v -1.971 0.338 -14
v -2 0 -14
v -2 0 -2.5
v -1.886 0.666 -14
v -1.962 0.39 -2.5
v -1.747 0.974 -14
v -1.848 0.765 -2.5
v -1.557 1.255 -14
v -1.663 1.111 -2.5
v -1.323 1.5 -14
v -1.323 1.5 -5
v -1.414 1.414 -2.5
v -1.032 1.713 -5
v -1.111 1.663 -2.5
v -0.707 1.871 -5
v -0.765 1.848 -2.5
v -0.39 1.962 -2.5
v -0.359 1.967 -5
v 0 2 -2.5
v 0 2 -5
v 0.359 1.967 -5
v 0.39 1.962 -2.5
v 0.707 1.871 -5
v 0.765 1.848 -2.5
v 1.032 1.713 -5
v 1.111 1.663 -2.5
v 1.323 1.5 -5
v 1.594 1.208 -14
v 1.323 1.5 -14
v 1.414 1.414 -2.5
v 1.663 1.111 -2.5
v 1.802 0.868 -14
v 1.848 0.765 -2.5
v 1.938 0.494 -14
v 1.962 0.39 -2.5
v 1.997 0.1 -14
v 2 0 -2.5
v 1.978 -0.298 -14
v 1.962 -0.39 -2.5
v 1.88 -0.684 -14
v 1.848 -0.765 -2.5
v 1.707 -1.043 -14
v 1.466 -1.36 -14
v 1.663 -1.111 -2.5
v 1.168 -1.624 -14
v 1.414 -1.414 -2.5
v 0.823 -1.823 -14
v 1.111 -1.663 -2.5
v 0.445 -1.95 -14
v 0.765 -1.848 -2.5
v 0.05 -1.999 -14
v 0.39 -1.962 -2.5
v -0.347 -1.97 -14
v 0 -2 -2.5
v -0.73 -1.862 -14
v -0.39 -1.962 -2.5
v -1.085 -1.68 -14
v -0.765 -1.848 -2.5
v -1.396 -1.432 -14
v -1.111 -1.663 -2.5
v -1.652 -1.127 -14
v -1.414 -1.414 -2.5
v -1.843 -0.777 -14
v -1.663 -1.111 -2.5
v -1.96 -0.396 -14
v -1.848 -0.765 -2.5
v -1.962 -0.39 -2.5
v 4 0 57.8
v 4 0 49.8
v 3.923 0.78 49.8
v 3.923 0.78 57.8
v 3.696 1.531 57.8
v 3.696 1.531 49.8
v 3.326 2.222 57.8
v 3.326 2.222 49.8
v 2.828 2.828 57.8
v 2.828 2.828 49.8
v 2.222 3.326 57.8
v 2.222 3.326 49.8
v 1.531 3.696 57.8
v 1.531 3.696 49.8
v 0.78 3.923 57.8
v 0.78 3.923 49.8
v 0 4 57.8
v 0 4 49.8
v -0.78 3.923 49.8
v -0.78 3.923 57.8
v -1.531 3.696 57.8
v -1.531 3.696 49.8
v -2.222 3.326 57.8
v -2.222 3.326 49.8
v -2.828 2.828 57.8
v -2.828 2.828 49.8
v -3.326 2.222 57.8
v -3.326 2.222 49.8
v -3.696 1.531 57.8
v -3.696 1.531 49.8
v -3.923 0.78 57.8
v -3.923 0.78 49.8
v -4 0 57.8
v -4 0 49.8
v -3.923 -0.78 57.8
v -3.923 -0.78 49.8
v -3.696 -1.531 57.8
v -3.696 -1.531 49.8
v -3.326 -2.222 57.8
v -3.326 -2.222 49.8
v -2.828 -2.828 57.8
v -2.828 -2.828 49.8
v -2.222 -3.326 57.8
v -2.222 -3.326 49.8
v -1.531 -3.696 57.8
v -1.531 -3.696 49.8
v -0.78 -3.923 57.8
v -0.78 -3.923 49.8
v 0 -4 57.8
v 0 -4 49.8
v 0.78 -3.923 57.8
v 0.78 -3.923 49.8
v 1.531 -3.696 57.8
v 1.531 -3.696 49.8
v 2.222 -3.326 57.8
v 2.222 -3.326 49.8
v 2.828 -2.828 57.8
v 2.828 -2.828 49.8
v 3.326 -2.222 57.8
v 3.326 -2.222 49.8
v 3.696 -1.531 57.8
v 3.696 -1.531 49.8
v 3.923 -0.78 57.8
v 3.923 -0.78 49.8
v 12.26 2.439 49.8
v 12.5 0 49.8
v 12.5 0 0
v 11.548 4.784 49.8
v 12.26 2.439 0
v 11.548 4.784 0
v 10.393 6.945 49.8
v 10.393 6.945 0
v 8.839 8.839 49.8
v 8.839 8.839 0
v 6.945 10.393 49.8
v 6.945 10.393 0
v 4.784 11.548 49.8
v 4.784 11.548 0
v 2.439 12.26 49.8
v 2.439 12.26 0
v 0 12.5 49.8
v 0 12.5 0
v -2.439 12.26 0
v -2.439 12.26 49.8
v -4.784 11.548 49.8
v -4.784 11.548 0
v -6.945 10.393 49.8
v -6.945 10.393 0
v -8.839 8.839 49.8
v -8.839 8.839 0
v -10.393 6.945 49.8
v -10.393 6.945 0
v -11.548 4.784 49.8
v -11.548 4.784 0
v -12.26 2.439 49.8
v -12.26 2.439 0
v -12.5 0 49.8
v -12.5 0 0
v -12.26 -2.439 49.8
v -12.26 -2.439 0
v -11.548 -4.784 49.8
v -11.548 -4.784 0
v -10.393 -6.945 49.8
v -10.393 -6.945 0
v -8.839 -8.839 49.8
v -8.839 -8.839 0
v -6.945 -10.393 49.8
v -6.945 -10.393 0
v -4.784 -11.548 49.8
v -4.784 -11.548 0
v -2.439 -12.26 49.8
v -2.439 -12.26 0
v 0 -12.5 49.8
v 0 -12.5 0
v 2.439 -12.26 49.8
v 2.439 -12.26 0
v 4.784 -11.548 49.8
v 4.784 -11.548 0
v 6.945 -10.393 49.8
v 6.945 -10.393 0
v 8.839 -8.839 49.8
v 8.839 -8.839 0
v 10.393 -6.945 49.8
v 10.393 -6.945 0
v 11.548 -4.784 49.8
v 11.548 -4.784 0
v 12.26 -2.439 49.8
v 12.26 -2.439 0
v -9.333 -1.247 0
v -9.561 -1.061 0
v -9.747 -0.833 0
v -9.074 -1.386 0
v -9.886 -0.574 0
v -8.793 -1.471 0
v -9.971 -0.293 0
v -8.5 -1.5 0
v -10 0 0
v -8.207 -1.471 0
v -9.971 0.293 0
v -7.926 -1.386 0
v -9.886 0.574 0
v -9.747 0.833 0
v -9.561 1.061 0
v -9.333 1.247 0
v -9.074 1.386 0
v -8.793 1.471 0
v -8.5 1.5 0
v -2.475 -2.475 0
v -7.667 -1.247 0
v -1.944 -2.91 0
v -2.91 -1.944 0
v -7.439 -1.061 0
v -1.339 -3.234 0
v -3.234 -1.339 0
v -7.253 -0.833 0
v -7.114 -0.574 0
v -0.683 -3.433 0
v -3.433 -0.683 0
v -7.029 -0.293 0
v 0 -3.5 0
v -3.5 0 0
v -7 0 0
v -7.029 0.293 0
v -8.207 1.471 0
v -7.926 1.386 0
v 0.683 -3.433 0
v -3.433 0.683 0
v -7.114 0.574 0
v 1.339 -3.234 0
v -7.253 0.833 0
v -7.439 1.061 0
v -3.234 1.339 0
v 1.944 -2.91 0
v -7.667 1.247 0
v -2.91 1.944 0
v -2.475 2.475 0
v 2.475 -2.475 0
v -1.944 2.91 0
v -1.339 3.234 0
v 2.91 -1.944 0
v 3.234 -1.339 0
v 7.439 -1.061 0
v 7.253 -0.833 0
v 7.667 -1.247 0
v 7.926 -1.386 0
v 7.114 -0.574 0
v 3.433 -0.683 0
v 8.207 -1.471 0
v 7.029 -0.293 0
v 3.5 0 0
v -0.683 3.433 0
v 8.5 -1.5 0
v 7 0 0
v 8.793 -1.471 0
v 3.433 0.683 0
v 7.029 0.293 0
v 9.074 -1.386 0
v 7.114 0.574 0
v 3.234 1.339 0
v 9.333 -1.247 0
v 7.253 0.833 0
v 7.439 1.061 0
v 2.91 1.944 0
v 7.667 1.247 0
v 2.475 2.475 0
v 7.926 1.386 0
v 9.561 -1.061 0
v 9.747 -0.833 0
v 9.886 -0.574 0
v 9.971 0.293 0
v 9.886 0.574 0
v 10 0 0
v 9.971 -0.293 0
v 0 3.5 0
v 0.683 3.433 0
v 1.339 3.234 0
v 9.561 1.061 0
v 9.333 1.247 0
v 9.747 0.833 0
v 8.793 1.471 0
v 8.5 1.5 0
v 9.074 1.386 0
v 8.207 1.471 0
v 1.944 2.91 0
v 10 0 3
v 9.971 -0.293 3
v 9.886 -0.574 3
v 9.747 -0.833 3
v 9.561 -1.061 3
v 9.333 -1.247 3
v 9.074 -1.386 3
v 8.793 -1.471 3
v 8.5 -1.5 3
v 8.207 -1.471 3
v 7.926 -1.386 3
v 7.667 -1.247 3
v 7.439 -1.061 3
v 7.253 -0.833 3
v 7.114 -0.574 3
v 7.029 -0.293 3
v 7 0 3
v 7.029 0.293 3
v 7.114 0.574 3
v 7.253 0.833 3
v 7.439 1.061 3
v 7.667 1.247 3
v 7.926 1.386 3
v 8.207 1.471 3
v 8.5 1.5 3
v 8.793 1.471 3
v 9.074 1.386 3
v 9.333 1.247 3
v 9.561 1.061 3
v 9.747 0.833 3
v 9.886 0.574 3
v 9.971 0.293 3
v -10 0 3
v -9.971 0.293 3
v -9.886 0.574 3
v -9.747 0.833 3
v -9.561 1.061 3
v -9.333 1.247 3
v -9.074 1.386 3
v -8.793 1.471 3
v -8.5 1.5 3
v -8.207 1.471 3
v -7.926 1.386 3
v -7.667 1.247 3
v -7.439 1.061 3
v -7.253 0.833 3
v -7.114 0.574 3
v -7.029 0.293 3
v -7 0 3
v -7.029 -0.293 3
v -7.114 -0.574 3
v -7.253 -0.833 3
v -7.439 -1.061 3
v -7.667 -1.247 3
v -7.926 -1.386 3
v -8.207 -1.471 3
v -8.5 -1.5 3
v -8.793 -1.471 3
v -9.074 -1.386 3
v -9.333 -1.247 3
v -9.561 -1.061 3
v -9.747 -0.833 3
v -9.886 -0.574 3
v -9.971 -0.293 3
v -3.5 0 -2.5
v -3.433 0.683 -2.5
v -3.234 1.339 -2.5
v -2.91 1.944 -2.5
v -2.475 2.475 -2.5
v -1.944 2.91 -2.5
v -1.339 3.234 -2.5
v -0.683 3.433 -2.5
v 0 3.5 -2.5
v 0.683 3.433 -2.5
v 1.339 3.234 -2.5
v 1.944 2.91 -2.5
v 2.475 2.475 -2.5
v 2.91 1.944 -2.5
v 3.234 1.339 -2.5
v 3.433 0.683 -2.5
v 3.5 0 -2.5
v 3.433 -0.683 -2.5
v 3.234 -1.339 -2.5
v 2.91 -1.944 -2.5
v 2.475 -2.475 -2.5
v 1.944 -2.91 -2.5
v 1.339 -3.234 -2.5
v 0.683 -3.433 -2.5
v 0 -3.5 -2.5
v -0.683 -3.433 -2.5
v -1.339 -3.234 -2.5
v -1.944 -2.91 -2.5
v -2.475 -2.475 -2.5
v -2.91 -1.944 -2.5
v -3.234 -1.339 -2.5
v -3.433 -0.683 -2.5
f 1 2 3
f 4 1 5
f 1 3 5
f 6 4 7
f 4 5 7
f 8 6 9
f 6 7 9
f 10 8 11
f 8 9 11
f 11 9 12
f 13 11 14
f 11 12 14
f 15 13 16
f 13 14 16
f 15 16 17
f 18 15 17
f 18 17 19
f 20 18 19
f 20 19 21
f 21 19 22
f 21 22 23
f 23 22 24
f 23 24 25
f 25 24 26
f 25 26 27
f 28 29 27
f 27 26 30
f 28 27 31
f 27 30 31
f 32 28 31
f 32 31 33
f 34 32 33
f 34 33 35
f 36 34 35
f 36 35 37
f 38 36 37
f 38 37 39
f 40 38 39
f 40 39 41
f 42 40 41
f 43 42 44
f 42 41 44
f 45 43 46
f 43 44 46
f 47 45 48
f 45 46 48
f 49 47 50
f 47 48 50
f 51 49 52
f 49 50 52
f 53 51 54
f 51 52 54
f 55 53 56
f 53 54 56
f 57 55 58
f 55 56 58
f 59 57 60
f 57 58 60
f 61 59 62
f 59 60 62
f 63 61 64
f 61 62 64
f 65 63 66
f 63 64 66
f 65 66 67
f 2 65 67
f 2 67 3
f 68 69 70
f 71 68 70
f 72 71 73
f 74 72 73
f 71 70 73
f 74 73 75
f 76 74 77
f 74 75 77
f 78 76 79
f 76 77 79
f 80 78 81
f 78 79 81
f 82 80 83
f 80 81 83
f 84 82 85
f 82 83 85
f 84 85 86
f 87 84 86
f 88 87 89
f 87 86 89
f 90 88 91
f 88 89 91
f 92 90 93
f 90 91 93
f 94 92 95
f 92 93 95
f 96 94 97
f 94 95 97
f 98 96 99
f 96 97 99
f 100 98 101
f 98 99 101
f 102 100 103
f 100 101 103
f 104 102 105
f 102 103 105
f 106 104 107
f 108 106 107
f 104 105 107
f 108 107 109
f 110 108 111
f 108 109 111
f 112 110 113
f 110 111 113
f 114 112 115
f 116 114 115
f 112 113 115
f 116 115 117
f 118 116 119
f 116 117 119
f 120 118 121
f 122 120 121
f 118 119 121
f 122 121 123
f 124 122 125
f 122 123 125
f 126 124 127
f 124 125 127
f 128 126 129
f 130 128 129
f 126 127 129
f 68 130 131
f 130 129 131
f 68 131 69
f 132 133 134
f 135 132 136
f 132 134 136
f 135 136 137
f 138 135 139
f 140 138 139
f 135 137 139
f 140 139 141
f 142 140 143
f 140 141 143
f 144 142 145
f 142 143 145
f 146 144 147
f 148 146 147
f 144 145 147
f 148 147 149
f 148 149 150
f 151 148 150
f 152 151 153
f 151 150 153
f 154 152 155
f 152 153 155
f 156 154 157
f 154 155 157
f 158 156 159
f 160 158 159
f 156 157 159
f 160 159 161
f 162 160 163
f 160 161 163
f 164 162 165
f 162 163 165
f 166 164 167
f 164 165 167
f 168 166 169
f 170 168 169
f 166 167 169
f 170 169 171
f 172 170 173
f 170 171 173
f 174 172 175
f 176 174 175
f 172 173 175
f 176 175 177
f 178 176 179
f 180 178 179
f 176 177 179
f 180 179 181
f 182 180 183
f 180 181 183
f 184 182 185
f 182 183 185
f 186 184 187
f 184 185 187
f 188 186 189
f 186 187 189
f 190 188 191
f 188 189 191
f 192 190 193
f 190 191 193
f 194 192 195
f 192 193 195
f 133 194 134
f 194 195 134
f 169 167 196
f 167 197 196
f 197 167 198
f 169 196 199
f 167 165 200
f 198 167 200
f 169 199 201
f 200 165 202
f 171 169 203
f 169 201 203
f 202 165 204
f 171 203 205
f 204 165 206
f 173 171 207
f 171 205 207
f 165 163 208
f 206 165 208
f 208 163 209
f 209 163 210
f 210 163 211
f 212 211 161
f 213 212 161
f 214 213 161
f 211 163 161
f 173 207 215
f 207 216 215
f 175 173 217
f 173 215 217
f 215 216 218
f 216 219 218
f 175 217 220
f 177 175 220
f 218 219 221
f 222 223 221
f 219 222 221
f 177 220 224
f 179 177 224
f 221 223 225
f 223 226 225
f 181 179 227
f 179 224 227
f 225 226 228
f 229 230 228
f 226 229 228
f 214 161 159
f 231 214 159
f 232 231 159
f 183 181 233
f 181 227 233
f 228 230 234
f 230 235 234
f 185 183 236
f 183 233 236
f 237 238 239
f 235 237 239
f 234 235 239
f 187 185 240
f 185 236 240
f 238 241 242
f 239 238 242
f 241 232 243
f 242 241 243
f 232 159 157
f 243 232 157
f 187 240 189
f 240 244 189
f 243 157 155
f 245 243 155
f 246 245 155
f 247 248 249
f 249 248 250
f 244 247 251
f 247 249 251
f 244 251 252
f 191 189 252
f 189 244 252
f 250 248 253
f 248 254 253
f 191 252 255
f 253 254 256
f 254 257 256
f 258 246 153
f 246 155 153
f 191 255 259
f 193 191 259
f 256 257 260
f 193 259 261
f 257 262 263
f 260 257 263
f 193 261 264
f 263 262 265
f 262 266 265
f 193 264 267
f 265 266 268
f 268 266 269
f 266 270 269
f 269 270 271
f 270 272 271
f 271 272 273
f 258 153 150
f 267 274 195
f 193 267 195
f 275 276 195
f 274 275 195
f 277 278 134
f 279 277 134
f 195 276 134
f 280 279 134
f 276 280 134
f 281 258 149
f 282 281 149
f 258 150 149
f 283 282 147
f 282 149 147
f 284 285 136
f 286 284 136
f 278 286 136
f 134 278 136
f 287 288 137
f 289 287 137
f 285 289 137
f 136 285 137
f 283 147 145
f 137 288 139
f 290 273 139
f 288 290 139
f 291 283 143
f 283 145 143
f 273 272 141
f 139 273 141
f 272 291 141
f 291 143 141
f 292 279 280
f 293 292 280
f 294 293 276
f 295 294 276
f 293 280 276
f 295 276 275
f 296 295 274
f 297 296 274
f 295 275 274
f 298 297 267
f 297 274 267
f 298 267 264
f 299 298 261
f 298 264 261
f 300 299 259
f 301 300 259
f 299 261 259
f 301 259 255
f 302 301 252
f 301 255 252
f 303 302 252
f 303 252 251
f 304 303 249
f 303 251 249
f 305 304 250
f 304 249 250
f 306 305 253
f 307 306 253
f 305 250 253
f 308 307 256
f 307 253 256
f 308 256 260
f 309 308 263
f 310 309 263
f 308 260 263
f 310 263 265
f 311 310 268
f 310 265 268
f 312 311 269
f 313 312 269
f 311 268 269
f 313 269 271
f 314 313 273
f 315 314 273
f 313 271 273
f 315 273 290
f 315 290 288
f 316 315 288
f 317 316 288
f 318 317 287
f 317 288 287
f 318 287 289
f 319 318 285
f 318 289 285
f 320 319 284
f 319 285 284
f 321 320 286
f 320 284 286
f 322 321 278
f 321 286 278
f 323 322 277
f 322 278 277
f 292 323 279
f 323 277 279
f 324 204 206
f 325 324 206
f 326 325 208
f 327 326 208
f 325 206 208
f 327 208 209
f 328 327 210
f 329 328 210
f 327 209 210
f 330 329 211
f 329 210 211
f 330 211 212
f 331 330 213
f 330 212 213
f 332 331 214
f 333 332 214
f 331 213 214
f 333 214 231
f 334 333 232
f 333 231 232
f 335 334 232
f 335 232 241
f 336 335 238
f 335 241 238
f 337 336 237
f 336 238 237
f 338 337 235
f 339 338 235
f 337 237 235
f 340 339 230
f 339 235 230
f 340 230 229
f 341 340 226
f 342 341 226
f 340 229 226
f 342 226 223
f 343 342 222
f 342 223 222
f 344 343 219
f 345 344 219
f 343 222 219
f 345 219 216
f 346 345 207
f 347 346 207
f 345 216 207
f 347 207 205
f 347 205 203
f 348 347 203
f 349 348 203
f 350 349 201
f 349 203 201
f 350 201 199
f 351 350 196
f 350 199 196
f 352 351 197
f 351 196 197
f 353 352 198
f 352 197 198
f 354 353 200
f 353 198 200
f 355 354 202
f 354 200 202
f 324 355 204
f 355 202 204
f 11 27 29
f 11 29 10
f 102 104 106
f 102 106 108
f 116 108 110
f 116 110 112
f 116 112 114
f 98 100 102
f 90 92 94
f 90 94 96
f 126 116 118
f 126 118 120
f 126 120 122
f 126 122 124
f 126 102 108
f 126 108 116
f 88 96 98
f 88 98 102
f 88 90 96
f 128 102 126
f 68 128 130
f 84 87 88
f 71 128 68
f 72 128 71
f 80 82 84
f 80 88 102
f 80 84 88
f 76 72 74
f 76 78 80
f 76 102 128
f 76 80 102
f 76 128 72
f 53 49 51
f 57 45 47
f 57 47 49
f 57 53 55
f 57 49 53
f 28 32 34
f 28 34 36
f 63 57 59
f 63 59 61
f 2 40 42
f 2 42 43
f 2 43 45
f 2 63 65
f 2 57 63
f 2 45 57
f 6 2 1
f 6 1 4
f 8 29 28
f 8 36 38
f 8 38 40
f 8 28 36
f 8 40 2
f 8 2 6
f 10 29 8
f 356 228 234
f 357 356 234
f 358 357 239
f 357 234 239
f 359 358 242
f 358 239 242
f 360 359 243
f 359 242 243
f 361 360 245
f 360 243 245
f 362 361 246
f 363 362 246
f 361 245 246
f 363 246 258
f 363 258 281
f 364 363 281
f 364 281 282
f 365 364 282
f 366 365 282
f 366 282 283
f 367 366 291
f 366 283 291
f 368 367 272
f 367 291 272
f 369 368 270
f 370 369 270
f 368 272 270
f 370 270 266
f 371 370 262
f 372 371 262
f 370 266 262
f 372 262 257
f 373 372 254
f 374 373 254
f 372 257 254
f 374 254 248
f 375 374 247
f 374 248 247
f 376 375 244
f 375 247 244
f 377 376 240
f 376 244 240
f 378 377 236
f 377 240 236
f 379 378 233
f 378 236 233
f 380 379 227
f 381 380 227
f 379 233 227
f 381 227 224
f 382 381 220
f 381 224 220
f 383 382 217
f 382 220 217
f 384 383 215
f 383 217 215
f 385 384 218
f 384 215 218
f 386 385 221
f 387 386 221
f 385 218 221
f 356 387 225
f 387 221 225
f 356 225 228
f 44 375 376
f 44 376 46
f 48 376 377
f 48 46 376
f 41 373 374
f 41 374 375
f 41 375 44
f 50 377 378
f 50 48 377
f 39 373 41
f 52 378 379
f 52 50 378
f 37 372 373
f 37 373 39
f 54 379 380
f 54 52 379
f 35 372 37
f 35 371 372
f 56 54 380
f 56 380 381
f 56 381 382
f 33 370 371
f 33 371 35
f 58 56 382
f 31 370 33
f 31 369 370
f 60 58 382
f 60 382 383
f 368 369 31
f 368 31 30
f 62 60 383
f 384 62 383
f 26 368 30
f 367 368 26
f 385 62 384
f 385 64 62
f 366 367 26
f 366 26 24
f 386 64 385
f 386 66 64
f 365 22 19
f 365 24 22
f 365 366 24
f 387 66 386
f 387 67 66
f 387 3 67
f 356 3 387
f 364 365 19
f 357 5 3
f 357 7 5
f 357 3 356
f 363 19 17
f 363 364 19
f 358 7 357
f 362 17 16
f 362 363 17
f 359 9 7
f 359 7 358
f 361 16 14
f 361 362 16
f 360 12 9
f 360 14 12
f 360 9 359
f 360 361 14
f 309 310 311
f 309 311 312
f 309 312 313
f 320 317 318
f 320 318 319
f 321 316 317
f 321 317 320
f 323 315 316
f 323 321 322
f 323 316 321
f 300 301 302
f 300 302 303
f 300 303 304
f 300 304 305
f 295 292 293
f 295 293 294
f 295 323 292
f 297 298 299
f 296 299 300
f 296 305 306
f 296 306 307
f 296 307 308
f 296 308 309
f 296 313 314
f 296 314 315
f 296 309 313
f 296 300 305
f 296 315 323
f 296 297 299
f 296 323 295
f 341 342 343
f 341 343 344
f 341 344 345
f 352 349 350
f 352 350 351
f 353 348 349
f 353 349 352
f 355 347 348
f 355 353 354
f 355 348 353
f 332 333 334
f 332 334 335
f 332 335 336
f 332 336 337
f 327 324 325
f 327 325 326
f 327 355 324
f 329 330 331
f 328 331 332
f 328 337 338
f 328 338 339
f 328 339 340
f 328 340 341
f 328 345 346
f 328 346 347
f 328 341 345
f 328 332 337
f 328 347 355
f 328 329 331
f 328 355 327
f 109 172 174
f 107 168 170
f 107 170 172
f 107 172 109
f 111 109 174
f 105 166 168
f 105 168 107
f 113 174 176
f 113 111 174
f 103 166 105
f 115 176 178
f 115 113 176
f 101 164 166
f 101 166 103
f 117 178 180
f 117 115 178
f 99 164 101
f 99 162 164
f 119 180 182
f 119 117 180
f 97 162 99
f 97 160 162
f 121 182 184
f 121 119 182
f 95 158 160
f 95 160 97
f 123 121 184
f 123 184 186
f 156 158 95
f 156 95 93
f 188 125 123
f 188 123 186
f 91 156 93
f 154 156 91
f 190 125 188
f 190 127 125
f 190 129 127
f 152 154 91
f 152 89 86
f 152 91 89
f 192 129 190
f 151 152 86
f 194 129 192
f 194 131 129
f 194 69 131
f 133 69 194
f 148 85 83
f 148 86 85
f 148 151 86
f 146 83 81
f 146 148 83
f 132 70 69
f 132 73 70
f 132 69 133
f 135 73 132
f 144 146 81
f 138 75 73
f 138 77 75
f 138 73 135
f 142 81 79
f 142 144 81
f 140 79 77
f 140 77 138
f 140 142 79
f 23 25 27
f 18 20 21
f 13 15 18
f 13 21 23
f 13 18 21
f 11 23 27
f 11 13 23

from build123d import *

# Parameters (mm, degrees)
SKETCH_1_R          = 12.5
EXTRUDE_1_DEPTH     = 49.8
SKETCH_2_R          = 3.5
EXTRUDE_2_DEPTH     = 2.5
SKETCH_3_R          = 2
EXTRUDE_3_DEPTH     = 11.5
CUT_EXTRUDE_START   = -9
CUT_EXTRUDE_1_DEPTH = 9
SKETCH_5_R          = 1.5
CUT_EXTRUDE_2_DEPTH = 3
SKETCH_6_R          = 4
EXTRUDE_4_DEPTH     = 8


with BuildPart() as part:
    # 草图1 → 凸台-拉伸1 (new body)
    with BuildSketch(Plane.XY):
        Circle(SKETCH_1_R)
    extrude(amount=EXTRUDE_1_DEPTH)

    # 草图2 → 凸台-拉伸2 (add)
    with BuildSketch(Plane(origin=(0, 0, 0), x_dir=(-1, 0, 0), z_dir=(0, 0, -1))):
        Circle(SKETCH_2_R)
    extrude(amount=EXTRUDE_2_DEPTH)

    # 草图3 → 凸台-拉伸3 (add)
    with BuildSketch(Plane(origin=(0, 0, -2.5), x_dir=(-1, 0, 0), z_dir=(0, 0, -1))):
        Circle(SKETCH_3_R)
    extrude(amount=EXTRUDE_3_DEPTH)

    # 草图4 → 切除-拉伸1 (cut)
    with BuildSketch(Plane(origin=(0, 0, -14), x_dir=(-1, 0, 0), z_dir=(0, 0, -1)).offset(CUT_EXTRUDE_START)):
        with BuildLine():
            Line((-1.322875656, 1.5), (0, 1.5))
            Line((0, 1.5), (1.322875656, 1.5))
            ThreePointArc((1.322875656, 1.5), (0, 2), (-1.322875656, 1.5))
        make_face()
    extrude(amount=CUT_EXTRUDE_1_DEPTH, mode=Mode.SUBTRACT)

    # 草图5 → 切除-拉伸2 (cut)
    with BuildSketch(Plane(origin=(0, 0, 0), x_dir=(-1, 0, 0), z_dir=(0, 0, -1))):
        with Locations((8.5, 0)):
            Circle(SKETCH_5_R)
        with Locations(Location((-8.5, 0, 0), (0, 0, 180))):
            Circle(SKETCH_5_R)
    extrude(amount=-CUT_EXTRUDE_2_DEPTH, mode=Mode.SUBTRACT)

    # 草图6 → 凸台-拉伸4 (add)
    with BuildSketch(Plane.XY.offset(49.8)):
        Circle(SKETCH_6_R)
    extrude(amount=EXTRUDE_4_DEPTH)


solid = part.part
